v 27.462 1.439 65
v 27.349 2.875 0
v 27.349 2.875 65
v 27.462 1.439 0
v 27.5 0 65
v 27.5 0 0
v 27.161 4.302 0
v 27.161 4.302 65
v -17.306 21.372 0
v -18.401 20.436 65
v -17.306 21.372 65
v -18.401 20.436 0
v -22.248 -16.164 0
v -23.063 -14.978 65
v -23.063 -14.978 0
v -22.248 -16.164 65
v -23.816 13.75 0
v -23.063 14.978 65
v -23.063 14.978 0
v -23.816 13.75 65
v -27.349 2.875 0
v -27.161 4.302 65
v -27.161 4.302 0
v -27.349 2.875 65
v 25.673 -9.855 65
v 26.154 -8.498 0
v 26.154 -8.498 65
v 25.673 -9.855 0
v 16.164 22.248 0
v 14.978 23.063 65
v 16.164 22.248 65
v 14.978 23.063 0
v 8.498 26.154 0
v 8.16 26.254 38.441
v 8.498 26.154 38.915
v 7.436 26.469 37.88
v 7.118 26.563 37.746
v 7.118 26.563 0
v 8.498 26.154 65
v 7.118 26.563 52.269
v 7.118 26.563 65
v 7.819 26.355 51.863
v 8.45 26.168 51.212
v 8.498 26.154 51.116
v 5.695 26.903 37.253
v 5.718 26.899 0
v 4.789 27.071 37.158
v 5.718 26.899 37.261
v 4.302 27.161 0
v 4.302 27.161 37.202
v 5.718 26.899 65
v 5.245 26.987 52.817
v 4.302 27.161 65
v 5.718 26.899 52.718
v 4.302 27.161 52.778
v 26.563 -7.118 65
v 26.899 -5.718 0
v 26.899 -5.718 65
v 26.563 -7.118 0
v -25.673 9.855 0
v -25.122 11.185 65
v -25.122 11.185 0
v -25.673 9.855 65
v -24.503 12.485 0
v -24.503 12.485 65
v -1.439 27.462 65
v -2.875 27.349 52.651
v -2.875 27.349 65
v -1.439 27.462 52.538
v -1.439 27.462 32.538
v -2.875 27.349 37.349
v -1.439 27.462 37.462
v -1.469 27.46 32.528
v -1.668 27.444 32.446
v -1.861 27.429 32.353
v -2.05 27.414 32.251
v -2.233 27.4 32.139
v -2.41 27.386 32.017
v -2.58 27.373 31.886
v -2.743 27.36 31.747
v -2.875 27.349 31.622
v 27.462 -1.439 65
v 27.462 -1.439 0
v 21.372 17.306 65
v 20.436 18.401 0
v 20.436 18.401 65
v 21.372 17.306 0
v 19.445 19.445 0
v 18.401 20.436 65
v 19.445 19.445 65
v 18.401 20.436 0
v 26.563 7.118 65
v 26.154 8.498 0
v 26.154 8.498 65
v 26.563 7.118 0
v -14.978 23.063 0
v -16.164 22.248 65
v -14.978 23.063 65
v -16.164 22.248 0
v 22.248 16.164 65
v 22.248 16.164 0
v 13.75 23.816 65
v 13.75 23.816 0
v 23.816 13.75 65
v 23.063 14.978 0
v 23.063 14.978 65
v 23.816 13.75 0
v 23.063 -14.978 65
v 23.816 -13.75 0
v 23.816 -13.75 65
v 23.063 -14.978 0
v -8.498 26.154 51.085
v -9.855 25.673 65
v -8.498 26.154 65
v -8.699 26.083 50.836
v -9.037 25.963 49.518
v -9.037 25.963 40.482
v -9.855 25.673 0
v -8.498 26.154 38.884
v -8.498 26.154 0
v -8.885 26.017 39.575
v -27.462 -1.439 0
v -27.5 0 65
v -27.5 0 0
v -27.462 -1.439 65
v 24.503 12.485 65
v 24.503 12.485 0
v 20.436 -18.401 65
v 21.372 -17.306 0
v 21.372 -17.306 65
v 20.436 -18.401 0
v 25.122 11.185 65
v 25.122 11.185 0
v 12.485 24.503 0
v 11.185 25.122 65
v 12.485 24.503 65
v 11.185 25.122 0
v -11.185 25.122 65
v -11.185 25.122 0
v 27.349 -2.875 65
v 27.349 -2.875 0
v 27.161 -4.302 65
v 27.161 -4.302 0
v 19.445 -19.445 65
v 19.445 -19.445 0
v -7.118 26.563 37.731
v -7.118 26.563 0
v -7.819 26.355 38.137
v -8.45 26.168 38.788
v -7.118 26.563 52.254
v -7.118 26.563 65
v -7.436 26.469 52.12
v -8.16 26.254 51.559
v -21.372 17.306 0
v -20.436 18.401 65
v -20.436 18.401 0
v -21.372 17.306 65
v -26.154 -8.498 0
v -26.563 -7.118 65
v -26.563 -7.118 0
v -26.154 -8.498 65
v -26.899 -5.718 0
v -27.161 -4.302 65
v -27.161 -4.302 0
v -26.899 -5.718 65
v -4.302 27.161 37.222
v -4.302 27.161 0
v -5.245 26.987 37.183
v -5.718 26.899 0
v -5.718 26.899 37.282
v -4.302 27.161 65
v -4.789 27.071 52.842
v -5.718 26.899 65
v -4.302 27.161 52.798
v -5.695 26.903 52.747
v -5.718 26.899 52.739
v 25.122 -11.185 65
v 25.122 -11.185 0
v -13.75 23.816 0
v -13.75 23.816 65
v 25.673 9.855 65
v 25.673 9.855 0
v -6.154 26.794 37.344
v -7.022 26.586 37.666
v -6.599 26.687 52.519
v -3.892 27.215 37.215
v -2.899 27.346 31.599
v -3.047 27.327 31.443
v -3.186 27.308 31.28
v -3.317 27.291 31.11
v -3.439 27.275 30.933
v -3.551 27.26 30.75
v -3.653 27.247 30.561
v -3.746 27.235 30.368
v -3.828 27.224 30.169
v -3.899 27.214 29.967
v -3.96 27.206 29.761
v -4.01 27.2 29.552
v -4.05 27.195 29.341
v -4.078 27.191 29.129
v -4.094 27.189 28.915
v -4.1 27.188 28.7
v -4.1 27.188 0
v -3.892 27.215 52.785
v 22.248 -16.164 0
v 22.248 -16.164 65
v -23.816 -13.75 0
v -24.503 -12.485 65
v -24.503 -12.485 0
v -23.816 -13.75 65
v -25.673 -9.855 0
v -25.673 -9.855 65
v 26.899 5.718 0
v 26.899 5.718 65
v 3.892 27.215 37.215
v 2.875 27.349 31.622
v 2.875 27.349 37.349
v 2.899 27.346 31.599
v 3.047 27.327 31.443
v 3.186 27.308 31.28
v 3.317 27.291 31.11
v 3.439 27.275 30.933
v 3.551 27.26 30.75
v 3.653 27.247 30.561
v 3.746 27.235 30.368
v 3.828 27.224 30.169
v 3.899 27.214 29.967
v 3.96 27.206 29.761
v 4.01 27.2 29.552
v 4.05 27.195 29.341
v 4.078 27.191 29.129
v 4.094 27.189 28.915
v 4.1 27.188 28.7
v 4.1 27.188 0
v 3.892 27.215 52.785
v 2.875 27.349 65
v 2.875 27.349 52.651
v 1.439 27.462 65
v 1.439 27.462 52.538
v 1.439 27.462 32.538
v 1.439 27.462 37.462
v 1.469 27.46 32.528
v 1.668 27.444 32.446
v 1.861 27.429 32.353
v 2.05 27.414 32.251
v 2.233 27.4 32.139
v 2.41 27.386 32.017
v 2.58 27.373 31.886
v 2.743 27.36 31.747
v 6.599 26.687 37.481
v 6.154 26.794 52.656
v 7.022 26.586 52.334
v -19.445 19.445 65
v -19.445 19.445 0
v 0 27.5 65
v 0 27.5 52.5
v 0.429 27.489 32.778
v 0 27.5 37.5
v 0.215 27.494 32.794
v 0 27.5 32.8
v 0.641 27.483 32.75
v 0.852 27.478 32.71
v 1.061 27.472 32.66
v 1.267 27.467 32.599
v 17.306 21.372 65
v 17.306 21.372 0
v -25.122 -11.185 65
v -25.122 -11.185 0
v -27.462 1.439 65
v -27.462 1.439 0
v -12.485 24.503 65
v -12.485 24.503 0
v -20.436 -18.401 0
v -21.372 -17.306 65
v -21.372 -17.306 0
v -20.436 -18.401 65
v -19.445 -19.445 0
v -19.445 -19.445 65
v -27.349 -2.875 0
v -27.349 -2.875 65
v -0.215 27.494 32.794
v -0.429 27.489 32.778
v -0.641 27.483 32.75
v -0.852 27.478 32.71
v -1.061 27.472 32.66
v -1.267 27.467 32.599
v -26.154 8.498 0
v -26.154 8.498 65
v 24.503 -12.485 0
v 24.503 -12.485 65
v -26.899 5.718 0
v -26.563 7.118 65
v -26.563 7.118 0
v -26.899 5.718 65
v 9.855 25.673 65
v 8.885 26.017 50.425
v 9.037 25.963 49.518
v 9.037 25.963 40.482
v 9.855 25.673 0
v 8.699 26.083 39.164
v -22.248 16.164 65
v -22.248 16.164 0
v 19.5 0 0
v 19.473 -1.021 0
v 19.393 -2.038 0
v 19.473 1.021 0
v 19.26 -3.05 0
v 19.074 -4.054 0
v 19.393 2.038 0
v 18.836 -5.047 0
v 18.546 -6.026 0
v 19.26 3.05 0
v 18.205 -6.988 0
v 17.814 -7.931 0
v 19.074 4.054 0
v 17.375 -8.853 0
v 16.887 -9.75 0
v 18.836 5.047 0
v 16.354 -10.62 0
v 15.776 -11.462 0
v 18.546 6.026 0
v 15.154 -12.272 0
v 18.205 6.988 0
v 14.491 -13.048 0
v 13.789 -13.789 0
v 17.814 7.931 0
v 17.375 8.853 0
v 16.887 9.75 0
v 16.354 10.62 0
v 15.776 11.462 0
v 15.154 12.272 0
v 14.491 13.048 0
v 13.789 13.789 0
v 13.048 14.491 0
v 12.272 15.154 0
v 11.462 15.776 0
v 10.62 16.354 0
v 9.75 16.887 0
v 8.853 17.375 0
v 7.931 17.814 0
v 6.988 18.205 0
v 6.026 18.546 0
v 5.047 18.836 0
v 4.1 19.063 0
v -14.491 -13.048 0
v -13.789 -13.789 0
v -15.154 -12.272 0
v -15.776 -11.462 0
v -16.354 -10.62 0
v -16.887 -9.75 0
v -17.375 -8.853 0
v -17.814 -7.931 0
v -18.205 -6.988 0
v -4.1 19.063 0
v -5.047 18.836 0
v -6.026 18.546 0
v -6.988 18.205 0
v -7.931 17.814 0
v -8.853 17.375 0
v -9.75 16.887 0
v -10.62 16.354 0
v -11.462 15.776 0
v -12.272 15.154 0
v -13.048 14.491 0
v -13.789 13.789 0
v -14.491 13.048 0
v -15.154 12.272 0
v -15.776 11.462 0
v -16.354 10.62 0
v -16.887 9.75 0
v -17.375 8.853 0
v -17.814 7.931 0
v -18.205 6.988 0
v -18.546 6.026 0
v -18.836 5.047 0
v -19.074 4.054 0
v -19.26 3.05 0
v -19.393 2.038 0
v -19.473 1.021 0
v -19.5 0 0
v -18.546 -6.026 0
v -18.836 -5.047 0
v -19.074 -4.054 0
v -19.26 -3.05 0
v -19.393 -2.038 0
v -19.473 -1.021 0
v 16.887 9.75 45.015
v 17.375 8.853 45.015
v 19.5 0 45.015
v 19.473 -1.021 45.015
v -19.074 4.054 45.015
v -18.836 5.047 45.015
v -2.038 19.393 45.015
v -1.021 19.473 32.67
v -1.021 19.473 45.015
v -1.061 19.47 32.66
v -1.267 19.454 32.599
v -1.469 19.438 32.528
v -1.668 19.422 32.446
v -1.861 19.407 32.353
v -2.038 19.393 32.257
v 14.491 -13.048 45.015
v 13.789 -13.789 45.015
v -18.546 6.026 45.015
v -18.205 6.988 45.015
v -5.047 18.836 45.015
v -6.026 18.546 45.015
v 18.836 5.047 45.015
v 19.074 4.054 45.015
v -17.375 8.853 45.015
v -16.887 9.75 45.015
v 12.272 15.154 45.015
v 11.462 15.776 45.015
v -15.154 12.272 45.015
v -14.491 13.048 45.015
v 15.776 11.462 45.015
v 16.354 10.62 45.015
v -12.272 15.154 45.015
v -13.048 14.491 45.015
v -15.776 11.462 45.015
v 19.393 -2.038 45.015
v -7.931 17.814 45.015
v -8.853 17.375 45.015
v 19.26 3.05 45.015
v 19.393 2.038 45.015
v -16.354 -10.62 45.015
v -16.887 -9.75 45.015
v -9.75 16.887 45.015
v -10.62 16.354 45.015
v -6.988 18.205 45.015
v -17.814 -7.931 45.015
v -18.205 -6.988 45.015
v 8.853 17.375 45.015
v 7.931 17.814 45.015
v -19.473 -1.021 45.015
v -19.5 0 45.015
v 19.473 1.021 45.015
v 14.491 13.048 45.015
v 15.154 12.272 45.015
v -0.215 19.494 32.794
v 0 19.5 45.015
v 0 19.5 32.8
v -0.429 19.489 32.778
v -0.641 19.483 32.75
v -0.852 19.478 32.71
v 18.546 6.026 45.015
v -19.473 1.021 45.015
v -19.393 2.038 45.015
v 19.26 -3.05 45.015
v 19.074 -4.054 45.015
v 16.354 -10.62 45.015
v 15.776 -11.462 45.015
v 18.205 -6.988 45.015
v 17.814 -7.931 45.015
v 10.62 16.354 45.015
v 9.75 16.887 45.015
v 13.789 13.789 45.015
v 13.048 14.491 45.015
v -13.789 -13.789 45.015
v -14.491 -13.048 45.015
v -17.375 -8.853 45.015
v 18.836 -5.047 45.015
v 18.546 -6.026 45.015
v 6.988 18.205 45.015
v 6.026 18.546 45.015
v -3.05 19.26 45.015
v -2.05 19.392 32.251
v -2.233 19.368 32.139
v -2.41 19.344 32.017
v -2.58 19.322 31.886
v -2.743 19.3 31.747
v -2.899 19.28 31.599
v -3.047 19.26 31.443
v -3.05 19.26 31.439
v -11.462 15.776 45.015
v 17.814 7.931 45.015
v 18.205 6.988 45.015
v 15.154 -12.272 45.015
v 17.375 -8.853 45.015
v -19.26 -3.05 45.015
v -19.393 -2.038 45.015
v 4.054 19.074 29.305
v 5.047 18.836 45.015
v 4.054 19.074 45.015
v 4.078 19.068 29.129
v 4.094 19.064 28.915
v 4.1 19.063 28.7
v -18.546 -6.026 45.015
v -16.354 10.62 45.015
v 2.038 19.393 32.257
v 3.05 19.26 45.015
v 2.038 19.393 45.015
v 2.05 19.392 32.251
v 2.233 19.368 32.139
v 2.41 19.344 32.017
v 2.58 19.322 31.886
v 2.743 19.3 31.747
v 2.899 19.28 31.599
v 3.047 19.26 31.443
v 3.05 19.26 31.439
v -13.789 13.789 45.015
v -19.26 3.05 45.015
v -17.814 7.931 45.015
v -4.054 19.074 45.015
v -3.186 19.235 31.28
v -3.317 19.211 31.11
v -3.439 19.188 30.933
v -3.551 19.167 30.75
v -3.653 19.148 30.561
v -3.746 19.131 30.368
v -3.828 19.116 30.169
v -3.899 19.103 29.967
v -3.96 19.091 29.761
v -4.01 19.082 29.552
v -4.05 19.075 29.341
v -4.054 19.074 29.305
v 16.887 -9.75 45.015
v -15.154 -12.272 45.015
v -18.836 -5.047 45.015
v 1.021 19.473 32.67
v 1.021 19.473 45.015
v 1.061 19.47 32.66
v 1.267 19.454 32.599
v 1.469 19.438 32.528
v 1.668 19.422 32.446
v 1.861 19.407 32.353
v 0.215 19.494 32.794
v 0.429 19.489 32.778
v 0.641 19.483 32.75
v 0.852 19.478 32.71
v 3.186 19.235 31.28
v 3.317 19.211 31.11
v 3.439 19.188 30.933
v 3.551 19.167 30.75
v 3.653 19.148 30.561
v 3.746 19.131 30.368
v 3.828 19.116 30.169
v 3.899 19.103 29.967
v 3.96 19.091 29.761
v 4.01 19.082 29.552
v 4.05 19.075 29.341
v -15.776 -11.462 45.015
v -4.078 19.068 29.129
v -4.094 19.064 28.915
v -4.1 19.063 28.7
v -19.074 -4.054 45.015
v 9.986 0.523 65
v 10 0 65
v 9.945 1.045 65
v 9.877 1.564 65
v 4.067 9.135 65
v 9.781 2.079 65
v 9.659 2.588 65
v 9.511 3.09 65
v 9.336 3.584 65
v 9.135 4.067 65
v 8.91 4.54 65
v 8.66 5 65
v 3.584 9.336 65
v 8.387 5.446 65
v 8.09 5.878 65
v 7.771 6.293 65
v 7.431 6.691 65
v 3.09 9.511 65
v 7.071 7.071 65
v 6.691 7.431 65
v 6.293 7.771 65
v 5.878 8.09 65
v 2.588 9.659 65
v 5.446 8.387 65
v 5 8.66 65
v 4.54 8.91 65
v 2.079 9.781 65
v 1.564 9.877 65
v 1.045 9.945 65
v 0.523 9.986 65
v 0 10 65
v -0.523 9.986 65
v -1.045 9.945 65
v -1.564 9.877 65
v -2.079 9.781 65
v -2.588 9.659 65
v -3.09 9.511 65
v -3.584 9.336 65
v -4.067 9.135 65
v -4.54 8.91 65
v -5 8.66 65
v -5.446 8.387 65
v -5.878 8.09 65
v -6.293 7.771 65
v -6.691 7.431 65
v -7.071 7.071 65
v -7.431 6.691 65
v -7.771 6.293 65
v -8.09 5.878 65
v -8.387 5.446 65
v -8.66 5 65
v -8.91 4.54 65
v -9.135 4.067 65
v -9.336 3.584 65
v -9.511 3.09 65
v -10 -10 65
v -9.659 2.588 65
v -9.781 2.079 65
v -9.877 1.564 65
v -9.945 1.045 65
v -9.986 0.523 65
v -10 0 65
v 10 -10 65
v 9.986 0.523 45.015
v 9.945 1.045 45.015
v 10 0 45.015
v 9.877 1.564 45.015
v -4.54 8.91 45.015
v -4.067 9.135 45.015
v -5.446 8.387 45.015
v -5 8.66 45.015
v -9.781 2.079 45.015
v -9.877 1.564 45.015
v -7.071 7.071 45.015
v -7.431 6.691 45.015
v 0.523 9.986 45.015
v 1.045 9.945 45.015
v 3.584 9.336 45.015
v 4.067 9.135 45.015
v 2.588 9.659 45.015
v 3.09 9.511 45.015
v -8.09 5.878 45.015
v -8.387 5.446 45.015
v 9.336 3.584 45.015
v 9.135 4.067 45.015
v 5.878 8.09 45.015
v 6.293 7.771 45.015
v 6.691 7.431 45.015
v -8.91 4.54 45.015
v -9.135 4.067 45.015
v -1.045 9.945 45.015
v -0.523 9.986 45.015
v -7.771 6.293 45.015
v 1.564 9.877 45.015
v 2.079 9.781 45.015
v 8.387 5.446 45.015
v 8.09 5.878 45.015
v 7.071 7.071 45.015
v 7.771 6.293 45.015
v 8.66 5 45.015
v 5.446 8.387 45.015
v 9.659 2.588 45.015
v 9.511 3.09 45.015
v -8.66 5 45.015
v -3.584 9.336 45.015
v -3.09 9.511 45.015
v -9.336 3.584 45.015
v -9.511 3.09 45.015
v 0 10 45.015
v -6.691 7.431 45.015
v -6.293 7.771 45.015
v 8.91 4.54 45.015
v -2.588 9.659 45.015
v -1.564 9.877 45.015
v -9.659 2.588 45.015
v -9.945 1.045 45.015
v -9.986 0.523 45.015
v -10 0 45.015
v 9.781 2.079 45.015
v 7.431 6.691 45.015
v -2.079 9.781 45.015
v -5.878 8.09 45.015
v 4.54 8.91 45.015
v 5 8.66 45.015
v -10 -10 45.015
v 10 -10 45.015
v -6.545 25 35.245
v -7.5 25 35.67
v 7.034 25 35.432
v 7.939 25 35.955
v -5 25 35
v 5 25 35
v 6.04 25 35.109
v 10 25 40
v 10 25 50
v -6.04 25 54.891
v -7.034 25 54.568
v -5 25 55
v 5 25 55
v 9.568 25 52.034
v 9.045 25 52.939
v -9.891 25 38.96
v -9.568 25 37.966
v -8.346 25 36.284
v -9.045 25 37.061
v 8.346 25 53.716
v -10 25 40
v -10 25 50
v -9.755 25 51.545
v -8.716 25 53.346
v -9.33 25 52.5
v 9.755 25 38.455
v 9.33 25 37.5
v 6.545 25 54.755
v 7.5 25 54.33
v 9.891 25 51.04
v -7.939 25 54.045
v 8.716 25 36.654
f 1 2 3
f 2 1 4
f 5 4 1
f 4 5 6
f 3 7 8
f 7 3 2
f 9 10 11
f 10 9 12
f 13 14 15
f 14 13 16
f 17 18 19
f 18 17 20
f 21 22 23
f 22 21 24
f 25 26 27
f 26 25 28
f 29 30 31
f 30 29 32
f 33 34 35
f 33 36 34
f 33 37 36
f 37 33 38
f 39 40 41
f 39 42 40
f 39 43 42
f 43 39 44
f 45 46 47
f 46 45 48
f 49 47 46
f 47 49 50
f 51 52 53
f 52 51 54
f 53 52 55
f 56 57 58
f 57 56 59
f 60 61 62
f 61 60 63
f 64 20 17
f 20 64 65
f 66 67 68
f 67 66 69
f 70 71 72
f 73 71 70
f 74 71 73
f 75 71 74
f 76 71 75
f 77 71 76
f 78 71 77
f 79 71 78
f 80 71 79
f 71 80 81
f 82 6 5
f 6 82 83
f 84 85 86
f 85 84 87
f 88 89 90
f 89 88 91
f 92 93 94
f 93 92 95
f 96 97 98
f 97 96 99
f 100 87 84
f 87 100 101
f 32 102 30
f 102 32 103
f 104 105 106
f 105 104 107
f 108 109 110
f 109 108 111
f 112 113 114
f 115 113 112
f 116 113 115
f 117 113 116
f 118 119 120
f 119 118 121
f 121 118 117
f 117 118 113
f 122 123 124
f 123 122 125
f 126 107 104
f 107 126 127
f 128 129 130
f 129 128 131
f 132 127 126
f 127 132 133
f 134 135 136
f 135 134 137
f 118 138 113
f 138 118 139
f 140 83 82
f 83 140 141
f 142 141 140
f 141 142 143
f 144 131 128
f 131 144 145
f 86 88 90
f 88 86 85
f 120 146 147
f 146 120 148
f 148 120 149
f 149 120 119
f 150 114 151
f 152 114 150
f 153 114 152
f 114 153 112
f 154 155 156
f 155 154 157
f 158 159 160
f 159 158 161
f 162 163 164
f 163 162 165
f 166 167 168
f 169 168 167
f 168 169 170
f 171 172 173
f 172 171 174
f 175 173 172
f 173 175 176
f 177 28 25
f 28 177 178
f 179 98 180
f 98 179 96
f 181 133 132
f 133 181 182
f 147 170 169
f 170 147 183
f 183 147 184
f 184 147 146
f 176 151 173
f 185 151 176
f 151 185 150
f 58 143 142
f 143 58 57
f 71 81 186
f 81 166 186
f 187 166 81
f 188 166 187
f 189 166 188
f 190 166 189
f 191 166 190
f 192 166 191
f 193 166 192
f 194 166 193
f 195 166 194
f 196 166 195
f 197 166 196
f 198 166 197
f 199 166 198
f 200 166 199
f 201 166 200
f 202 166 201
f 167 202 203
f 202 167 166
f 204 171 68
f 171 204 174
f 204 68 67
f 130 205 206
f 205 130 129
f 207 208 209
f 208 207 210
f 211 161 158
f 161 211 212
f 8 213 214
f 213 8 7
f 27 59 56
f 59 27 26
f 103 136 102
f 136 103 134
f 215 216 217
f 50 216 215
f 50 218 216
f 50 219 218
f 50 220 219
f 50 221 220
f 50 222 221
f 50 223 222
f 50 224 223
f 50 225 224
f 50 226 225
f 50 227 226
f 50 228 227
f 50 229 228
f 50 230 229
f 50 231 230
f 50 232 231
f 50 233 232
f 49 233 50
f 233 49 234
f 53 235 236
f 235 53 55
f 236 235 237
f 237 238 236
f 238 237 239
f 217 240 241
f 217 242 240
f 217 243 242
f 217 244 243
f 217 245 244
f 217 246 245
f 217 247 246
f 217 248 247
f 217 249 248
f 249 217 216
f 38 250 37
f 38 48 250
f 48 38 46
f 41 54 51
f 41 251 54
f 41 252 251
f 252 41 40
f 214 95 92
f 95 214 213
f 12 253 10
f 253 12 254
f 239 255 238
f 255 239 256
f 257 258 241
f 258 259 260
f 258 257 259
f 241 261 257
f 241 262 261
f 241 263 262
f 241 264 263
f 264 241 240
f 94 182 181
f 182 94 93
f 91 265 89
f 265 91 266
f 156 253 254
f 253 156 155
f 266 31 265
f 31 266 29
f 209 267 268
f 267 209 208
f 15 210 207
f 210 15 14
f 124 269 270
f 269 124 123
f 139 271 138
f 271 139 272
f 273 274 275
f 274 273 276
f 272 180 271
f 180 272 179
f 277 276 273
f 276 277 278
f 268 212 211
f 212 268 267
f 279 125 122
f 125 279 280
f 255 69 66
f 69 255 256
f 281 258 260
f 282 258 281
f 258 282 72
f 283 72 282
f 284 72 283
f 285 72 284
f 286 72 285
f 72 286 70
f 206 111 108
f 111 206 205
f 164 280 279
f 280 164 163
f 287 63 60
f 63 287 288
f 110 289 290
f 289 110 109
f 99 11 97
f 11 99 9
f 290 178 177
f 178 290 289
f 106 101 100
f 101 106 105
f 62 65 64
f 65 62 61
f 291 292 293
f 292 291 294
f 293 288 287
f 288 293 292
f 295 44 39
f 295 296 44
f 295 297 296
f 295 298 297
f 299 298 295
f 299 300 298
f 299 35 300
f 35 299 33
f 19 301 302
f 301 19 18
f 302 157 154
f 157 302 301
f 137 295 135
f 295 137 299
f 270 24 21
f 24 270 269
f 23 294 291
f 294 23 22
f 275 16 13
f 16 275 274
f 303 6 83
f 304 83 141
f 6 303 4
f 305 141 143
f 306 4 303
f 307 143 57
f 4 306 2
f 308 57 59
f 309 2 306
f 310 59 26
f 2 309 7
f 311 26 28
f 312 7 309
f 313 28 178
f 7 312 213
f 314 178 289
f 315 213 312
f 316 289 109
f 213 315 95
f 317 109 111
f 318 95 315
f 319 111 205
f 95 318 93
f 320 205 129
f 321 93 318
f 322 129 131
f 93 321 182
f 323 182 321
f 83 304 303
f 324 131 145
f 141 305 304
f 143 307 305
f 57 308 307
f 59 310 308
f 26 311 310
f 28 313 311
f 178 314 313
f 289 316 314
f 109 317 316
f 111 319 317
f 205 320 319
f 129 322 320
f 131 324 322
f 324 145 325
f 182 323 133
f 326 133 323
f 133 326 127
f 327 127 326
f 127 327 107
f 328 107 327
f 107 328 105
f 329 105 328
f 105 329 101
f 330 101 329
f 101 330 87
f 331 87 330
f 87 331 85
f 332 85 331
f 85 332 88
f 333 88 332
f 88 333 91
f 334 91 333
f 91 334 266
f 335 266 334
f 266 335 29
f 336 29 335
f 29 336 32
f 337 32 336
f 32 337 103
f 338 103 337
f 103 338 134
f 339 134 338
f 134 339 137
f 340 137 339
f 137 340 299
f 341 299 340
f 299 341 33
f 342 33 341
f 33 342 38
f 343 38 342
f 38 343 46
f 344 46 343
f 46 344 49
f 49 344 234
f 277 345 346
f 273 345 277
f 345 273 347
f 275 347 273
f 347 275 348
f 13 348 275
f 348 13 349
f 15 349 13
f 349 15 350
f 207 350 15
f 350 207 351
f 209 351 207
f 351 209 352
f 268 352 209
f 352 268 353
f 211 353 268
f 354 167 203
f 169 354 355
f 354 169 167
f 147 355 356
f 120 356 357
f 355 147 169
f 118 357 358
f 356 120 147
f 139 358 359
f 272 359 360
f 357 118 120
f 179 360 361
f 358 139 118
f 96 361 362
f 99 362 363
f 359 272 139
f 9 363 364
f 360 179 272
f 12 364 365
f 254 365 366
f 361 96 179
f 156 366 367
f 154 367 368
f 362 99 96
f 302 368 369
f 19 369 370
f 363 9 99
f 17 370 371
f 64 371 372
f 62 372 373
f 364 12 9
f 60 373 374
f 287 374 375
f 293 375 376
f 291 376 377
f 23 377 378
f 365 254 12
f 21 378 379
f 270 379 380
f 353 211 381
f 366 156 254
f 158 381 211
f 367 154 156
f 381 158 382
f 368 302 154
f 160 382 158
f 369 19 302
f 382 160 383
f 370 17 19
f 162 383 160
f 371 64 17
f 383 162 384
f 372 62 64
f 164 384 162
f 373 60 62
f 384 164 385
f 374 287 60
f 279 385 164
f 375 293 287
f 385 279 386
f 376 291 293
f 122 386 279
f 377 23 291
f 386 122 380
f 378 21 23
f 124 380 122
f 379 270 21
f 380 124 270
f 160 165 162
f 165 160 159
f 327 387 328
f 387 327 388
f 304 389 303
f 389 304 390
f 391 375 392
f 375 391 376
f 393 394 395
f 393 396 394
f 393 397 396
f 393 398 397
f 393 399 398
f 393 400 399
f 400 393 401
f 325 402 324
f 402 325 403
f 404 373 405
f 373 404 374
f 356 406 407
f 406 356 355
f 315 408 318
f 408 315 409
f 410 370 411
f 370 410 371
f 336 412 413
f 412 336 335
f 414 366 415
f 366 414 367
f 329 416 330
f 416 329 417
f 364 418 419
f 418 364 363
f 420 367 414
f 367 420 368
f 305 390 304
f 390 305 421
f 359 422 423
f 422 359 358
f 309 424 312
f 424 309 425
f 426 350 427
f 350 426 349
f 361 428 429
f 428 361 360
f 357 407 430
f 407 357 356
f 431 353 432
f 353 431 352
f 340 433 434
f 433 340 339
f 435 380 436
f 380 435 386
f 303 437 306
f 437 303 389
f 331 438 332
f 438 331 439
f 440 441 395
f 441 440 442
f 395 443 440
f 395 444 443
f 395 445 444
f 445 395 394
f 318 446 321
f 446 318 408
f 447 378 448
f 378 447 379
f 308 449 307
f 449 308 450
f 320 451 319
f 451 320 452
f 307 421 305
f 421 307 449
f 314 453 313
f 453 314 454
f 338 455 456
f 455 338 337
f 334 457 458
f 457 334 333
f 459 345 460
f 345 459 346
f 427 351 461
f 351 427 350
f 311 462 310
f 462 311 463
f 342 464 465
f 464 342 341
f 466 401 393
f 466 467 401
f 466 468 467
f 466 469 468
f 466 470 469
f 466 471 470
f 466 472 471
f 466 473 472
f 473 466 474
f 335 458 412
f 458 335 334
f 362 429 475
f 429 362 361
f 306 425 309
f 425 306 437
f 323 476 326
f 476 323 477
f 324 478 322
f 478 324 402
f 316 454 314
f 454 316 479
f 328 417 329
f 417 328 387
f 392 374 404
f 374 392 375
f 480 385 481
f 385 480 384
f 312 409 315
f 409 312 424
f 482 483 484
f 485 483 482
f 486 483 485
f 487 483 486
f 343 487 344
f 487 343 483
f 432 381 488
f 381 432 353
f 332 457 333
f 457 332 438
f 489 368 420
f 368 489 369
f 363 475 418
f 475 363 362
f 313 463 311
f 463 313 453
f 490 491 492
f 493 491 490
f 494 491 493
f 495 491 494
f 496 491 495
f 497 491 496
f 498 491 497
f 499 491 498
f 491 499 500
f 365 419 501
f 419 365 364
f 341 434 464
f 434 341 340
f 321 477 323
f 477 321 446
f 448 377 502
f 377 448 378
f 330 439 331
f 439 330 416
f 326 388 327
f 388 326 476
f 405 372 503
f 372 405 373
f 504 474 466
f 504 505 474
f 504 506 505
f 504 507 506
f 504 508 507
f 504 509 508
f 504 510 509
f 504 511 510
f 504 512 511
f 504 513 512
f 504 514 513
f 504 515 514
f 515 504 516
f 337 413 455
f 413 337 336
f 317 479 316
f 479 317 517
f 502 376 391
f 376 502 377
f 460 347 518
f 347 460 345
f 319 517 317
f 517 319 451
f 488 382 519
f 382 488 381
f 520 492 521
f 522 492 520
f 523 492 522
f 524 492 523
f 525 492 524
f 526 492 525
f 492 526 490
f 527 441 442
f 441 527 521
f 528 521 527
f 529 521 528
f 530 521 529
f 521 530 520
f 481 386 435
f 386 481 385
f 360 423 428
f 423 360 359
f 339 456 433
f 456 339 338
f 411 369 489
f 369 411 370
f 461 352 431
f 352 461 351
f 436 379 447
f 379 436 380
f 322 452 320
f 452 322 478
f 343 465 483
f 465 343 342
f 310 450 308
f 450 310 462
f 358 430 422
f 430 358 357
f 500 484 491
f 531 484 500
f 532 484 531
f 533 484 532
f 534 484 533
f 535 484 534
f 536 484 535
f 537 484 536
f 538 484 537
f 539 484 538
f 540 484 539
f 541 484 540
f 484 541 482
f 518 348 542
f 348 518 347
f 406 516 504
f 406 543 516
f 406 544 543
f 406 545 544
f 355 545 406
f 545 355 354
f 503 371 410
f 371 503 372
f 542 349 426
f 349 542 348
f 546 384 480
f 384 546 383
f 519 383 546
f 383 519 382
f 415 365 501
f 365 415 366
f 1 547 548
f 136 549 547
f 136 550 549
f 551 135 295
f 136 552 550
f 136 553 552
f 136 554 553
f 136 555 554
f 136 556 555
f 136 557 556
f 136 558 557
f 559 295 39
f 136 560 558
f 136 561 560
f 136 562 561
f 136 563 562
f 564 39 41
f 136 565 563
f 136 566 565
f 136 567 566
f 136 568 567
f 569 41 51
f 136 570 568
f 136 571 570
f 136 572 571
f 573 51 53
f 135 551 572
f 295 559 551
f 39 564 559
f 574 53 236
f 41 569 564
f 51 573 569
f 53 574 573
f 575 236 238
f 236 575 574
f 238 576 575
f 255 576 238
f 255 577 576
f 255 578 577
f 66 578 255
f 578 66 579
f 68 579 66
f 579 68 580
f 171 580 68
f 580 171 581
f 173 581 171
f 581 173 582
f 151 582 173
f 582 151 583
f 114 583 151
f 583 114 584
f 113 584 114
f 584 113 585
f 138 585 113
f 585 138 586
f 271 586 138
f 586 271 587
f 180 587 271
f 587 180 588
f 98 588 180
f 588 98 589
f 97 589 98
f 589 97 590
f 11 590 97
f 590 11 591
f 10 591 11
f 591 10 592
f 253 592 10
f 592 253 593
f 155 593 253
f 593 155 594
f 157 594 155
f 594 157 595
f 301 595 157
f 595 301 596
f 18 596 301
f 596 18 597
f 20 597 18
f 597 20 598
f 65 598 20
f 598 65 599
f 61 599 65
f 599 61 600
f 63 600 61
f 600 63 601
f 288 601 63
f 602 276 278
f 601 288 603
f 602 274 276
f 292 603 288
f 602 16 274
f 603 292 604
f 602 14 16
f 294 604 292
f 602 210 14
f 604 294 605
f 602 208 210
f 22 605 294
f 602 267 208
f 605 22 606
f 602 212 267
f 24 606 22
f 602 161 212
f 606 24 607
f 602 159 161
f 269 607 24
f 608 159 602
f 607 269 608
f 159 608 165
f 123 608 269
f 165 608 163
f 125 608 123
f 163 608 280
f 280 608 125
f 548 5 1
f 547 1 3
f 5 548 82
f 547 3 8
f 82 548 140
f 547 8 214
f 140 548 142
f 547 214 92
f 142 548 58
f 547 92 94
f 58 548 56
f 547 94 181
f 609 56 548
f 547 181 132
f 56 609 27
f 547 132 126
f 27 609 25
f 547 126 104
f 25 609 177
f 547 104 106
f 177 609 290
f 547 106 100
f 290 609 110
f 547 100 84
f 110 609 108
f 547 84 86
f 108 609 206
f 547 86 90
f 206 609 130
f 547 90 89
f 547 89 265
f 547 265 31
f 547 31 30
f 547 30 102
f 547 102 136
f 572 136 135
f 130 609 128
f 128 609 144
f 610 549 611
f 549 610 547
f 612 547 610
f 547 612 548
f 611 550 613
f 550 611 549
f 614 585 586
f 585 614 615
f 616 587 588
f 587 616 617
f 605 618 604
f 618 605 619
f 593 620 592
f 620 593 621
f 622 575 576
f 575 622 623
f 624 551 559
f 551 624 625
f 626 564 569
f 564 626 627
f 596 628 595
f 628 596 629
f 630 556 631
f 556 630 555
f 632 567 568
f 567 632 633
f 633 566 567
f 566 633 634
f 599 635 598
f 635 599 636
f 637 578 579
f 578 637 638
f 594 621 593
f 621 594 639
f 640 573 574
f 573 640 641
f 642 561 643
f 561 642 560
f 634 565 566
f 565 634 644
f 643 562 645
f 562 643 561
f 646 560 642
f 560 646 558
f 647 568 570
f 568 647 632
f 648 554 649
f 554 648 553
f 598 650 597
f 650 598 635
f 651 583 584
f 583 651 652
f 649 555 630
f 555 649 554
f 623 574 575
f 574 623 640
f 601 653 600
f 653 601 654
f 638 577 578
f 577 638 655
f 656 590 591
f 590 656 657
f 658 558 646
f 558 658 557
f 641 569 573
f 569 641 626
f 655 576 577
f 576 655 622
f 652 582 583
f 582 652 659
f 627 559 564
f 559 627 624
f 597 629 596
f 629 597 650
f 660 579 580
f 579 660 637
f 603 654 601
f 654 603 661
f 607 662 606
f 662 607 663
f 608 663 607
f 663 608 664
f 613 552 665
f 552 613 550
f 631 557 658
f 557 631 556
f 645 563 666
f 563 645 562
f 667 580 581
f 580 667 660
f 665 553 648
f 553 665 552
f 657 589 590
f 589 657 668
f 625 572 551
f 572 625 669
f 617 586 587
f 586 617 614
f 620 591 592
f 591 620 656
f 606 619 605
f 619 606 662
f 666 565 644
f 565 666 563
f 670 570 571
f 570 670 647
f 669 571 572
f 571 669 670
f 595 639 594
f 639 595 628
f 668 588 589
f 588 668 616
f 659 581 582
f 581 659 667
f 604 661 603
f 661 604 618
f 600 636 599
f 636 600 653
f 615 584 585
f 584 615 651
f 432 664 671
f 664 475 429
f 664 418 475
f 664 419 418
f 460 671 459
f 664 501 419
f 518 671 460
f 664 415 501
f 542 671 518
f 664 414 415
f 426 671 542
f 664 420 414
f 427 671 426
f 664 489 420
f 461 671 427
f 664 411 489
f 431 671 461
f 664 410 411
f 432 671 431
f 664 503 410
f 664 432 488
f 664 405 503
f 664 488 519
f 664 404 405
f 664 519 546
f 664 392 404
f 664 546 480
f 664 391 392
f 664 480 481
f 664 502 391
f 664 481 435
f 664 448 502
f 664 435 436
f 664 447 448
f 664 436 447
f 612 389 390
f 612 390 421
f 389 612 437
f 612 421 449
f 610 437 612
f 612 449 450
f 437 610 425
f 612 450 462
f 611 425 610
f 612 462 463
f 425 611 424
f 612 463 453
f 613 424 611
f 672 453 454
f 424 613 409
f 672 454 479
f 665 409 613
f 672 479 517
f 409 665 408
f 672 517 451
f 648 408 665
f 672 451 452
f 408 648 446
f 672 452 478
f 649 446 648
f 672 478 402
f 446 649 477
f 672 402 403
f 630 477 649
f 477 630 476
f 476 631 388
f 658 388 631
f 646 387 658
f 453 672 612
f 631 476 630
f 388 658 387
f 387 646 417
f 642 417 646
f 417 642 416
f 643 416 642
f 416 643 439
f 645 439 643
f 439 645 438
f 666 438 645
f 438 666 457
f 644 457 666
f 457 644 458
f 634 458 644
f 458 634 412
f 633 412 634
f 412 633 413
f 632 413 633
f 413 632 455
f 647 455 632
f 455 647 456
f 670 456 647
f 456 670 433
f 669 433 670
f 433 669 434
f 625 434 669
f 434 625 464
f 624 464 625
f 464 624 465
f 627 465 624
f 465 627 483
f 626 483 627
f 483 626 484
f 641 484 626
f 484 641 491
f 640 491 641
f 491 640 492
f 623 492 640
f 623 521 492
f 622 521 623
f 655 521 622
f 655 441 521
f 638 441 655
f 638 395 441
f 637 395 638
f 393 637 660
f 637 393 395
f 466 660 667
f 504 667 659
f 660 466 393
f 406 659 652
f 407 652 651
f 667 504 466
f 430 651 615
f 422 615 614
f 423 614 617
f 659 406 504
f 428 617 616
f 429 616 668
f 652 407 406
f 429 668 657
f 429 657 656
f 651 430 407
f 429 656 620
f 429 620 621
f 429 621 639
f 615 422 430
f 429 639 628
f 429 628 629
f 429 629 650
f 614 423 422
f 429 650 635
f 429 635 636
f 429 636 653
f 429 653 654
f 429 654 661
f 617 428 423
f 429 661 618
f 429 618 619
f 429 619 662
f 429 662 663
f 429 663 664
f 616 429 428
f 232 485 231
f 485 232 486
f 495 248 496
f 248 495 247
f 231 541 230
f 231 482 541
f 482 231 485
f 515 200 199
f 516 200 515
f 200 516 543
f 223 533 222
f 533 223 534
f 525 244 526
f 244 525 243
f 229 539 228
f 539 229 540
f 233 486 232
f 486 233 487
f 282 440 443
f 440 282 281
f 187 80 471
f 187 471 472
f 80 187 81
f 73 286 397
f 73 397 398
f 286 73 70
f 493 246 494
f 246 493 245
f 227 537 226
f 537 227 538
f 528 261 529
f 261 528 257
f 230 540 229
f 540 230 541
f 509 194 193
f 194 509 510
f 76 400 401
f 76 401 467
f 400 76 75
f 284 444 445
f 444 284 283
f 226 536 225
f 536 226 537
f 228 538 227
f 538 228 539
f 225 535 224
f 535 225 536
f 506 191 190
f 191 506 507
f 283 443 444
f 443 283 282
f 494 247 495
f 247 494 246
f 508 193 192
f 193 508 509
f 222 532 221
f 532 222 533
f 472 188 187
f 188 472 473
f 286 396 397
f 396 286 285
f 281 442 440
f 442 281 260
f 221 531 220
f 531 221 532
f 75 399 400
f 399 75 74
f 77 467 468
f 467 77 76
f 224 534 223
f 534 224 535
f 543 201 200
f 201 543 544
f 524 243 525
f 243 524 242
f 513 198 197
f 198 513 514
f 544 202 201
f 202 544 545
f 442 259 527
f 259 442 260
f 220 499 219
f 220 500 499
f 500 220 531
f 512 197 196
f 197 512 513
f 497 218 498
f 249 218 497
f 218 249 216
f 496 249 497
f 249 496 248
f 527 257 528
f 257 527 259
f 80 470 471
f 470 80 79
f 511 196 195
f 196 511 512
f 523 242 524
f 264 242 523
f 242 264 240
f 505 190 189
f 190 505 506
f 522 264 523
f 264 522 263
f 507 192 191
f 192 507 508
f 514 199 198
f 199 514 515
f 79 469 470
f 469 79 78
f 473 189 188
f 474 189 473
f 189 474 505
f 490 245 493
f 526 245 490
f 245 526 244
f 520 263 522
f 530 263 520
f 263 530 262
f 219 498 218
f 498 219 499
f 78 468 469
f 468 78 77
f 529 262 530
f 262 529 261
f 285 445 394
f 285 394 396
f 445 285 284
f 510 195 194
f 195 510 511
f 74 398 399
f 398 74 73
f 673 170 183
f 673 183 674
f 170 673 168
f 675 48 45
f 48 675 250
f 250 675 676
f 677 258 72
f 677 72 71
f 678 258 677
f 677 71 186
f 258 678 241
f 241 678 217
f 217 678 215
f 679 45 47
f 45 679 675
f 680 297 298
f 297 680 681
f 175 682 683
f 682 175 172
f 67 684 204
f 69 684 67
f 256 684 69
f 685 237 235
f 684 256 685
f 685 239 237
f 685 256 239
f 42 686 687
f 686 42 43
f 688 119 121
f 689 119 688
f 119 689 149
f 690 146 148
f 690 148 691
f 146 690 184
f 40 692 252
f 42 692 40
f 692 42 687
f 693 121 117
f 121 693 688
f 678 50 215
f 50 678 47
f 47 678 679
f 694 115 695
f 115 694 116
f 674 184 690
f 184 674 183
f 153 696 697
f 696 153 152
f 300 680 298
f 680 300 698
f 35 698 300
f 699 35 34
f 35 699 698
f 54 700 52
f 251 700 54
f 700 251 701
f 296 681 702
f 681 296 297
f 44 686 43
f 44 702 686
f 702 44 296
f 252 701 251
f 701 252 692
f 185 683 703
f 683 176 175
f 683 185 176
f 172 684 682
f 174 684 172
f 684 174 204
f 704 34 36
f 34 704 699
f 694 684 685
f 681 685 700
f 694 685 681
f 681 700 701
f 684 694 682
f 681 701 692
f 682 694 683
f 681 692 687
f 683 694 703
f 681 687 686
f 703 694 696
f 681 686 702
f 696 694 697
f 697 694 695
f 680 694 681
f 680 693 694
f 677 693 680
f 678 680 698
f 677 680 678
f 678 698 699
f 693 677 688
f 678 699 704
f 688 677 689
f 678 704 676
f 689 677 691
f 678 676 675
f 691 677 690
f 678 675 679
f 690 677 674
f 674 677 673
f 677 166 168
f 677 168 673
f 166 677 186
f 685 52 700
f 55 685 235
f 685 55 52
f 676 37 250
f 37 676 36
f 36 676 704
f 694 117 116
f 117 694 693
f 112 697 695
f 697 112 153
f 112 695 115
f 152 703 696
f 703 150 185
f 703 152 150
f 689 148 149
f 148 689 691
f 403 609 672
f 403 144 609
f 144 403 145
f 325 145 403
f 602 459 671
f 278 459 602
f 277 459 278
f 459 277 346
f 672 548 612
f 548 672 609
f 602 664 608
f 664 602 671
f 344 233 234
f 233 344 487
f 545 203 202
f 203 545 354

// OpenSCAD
// file: config.scad
include <constructive-compiled.scad>

$fn=$preview ? 30 : 120;
fnCornerValue = $preview ? 10 : 30;

baseOuterD=55;
// Here, Thick means the thick part of the faucet,
// and Thin means the thin part of the faucet. So the
// thick D number is bigger than the thin D number.
baseInnerThinD=20;
baseInnerThickD=39;
baseThickH=45;
// We have baseOuterD = baseInnerThickD + baseThickWall * 2. So
// baseThickWall = baseOuterD - baseInnerThickD
baseThickWall=(baseOuterD-baseInnerThickD)/2;

baseThinH=20;
// Again, baseOuterD = baseInnerThinD + baseThinWall * 2. So
// baseThinWall = (baseOuterD - baseInnerThinD)/2. Note that
// this means baseThinWall is larger than baseThickWall. This
// is because the wall for the thin pipe is larger than the
// wall for the thick pipe.
baseThinWall=(baseOuterD-baseInnerThinD)/2;
baseH=baseThickH + baseThinH;
EPS=0.1;

module handle() {
    turnYZ(90) chamfer(-1, 5, 5, fnCorner=fnCornerValue) box(10, z=70);
}
// main file
include <config.scad>

assemble() {
    g() {
        TOUP() stack(TOUP) { 
            tube(d=baseOuterD, h=baseThickH, wall=baseThickWall)
            tube(d=baseOuterD, h=baseThinH, wall=baseThinWall)
            ;
        };
        remove() {
            turnXY(-135) X(baseOuterD/2) Y(baseOuterD/2) Z(-EPS) TOUP() box(55, h=baseH+2*EPS);
            Y(-baseOuterD/4) TOUP() box(x=baseInnerThinD,
                y=baseOuterD/2,
                z=baseH+2*EPS);
            Z(65-40.3+4) turnYZ(90) tube(d=8.2, h=60, solid=true);
            TOUP() Y(baseOuterD/2) box(65-40.3+4, x=8.2);
            Z(45) Y(60) handle();
        }
    }
}    
